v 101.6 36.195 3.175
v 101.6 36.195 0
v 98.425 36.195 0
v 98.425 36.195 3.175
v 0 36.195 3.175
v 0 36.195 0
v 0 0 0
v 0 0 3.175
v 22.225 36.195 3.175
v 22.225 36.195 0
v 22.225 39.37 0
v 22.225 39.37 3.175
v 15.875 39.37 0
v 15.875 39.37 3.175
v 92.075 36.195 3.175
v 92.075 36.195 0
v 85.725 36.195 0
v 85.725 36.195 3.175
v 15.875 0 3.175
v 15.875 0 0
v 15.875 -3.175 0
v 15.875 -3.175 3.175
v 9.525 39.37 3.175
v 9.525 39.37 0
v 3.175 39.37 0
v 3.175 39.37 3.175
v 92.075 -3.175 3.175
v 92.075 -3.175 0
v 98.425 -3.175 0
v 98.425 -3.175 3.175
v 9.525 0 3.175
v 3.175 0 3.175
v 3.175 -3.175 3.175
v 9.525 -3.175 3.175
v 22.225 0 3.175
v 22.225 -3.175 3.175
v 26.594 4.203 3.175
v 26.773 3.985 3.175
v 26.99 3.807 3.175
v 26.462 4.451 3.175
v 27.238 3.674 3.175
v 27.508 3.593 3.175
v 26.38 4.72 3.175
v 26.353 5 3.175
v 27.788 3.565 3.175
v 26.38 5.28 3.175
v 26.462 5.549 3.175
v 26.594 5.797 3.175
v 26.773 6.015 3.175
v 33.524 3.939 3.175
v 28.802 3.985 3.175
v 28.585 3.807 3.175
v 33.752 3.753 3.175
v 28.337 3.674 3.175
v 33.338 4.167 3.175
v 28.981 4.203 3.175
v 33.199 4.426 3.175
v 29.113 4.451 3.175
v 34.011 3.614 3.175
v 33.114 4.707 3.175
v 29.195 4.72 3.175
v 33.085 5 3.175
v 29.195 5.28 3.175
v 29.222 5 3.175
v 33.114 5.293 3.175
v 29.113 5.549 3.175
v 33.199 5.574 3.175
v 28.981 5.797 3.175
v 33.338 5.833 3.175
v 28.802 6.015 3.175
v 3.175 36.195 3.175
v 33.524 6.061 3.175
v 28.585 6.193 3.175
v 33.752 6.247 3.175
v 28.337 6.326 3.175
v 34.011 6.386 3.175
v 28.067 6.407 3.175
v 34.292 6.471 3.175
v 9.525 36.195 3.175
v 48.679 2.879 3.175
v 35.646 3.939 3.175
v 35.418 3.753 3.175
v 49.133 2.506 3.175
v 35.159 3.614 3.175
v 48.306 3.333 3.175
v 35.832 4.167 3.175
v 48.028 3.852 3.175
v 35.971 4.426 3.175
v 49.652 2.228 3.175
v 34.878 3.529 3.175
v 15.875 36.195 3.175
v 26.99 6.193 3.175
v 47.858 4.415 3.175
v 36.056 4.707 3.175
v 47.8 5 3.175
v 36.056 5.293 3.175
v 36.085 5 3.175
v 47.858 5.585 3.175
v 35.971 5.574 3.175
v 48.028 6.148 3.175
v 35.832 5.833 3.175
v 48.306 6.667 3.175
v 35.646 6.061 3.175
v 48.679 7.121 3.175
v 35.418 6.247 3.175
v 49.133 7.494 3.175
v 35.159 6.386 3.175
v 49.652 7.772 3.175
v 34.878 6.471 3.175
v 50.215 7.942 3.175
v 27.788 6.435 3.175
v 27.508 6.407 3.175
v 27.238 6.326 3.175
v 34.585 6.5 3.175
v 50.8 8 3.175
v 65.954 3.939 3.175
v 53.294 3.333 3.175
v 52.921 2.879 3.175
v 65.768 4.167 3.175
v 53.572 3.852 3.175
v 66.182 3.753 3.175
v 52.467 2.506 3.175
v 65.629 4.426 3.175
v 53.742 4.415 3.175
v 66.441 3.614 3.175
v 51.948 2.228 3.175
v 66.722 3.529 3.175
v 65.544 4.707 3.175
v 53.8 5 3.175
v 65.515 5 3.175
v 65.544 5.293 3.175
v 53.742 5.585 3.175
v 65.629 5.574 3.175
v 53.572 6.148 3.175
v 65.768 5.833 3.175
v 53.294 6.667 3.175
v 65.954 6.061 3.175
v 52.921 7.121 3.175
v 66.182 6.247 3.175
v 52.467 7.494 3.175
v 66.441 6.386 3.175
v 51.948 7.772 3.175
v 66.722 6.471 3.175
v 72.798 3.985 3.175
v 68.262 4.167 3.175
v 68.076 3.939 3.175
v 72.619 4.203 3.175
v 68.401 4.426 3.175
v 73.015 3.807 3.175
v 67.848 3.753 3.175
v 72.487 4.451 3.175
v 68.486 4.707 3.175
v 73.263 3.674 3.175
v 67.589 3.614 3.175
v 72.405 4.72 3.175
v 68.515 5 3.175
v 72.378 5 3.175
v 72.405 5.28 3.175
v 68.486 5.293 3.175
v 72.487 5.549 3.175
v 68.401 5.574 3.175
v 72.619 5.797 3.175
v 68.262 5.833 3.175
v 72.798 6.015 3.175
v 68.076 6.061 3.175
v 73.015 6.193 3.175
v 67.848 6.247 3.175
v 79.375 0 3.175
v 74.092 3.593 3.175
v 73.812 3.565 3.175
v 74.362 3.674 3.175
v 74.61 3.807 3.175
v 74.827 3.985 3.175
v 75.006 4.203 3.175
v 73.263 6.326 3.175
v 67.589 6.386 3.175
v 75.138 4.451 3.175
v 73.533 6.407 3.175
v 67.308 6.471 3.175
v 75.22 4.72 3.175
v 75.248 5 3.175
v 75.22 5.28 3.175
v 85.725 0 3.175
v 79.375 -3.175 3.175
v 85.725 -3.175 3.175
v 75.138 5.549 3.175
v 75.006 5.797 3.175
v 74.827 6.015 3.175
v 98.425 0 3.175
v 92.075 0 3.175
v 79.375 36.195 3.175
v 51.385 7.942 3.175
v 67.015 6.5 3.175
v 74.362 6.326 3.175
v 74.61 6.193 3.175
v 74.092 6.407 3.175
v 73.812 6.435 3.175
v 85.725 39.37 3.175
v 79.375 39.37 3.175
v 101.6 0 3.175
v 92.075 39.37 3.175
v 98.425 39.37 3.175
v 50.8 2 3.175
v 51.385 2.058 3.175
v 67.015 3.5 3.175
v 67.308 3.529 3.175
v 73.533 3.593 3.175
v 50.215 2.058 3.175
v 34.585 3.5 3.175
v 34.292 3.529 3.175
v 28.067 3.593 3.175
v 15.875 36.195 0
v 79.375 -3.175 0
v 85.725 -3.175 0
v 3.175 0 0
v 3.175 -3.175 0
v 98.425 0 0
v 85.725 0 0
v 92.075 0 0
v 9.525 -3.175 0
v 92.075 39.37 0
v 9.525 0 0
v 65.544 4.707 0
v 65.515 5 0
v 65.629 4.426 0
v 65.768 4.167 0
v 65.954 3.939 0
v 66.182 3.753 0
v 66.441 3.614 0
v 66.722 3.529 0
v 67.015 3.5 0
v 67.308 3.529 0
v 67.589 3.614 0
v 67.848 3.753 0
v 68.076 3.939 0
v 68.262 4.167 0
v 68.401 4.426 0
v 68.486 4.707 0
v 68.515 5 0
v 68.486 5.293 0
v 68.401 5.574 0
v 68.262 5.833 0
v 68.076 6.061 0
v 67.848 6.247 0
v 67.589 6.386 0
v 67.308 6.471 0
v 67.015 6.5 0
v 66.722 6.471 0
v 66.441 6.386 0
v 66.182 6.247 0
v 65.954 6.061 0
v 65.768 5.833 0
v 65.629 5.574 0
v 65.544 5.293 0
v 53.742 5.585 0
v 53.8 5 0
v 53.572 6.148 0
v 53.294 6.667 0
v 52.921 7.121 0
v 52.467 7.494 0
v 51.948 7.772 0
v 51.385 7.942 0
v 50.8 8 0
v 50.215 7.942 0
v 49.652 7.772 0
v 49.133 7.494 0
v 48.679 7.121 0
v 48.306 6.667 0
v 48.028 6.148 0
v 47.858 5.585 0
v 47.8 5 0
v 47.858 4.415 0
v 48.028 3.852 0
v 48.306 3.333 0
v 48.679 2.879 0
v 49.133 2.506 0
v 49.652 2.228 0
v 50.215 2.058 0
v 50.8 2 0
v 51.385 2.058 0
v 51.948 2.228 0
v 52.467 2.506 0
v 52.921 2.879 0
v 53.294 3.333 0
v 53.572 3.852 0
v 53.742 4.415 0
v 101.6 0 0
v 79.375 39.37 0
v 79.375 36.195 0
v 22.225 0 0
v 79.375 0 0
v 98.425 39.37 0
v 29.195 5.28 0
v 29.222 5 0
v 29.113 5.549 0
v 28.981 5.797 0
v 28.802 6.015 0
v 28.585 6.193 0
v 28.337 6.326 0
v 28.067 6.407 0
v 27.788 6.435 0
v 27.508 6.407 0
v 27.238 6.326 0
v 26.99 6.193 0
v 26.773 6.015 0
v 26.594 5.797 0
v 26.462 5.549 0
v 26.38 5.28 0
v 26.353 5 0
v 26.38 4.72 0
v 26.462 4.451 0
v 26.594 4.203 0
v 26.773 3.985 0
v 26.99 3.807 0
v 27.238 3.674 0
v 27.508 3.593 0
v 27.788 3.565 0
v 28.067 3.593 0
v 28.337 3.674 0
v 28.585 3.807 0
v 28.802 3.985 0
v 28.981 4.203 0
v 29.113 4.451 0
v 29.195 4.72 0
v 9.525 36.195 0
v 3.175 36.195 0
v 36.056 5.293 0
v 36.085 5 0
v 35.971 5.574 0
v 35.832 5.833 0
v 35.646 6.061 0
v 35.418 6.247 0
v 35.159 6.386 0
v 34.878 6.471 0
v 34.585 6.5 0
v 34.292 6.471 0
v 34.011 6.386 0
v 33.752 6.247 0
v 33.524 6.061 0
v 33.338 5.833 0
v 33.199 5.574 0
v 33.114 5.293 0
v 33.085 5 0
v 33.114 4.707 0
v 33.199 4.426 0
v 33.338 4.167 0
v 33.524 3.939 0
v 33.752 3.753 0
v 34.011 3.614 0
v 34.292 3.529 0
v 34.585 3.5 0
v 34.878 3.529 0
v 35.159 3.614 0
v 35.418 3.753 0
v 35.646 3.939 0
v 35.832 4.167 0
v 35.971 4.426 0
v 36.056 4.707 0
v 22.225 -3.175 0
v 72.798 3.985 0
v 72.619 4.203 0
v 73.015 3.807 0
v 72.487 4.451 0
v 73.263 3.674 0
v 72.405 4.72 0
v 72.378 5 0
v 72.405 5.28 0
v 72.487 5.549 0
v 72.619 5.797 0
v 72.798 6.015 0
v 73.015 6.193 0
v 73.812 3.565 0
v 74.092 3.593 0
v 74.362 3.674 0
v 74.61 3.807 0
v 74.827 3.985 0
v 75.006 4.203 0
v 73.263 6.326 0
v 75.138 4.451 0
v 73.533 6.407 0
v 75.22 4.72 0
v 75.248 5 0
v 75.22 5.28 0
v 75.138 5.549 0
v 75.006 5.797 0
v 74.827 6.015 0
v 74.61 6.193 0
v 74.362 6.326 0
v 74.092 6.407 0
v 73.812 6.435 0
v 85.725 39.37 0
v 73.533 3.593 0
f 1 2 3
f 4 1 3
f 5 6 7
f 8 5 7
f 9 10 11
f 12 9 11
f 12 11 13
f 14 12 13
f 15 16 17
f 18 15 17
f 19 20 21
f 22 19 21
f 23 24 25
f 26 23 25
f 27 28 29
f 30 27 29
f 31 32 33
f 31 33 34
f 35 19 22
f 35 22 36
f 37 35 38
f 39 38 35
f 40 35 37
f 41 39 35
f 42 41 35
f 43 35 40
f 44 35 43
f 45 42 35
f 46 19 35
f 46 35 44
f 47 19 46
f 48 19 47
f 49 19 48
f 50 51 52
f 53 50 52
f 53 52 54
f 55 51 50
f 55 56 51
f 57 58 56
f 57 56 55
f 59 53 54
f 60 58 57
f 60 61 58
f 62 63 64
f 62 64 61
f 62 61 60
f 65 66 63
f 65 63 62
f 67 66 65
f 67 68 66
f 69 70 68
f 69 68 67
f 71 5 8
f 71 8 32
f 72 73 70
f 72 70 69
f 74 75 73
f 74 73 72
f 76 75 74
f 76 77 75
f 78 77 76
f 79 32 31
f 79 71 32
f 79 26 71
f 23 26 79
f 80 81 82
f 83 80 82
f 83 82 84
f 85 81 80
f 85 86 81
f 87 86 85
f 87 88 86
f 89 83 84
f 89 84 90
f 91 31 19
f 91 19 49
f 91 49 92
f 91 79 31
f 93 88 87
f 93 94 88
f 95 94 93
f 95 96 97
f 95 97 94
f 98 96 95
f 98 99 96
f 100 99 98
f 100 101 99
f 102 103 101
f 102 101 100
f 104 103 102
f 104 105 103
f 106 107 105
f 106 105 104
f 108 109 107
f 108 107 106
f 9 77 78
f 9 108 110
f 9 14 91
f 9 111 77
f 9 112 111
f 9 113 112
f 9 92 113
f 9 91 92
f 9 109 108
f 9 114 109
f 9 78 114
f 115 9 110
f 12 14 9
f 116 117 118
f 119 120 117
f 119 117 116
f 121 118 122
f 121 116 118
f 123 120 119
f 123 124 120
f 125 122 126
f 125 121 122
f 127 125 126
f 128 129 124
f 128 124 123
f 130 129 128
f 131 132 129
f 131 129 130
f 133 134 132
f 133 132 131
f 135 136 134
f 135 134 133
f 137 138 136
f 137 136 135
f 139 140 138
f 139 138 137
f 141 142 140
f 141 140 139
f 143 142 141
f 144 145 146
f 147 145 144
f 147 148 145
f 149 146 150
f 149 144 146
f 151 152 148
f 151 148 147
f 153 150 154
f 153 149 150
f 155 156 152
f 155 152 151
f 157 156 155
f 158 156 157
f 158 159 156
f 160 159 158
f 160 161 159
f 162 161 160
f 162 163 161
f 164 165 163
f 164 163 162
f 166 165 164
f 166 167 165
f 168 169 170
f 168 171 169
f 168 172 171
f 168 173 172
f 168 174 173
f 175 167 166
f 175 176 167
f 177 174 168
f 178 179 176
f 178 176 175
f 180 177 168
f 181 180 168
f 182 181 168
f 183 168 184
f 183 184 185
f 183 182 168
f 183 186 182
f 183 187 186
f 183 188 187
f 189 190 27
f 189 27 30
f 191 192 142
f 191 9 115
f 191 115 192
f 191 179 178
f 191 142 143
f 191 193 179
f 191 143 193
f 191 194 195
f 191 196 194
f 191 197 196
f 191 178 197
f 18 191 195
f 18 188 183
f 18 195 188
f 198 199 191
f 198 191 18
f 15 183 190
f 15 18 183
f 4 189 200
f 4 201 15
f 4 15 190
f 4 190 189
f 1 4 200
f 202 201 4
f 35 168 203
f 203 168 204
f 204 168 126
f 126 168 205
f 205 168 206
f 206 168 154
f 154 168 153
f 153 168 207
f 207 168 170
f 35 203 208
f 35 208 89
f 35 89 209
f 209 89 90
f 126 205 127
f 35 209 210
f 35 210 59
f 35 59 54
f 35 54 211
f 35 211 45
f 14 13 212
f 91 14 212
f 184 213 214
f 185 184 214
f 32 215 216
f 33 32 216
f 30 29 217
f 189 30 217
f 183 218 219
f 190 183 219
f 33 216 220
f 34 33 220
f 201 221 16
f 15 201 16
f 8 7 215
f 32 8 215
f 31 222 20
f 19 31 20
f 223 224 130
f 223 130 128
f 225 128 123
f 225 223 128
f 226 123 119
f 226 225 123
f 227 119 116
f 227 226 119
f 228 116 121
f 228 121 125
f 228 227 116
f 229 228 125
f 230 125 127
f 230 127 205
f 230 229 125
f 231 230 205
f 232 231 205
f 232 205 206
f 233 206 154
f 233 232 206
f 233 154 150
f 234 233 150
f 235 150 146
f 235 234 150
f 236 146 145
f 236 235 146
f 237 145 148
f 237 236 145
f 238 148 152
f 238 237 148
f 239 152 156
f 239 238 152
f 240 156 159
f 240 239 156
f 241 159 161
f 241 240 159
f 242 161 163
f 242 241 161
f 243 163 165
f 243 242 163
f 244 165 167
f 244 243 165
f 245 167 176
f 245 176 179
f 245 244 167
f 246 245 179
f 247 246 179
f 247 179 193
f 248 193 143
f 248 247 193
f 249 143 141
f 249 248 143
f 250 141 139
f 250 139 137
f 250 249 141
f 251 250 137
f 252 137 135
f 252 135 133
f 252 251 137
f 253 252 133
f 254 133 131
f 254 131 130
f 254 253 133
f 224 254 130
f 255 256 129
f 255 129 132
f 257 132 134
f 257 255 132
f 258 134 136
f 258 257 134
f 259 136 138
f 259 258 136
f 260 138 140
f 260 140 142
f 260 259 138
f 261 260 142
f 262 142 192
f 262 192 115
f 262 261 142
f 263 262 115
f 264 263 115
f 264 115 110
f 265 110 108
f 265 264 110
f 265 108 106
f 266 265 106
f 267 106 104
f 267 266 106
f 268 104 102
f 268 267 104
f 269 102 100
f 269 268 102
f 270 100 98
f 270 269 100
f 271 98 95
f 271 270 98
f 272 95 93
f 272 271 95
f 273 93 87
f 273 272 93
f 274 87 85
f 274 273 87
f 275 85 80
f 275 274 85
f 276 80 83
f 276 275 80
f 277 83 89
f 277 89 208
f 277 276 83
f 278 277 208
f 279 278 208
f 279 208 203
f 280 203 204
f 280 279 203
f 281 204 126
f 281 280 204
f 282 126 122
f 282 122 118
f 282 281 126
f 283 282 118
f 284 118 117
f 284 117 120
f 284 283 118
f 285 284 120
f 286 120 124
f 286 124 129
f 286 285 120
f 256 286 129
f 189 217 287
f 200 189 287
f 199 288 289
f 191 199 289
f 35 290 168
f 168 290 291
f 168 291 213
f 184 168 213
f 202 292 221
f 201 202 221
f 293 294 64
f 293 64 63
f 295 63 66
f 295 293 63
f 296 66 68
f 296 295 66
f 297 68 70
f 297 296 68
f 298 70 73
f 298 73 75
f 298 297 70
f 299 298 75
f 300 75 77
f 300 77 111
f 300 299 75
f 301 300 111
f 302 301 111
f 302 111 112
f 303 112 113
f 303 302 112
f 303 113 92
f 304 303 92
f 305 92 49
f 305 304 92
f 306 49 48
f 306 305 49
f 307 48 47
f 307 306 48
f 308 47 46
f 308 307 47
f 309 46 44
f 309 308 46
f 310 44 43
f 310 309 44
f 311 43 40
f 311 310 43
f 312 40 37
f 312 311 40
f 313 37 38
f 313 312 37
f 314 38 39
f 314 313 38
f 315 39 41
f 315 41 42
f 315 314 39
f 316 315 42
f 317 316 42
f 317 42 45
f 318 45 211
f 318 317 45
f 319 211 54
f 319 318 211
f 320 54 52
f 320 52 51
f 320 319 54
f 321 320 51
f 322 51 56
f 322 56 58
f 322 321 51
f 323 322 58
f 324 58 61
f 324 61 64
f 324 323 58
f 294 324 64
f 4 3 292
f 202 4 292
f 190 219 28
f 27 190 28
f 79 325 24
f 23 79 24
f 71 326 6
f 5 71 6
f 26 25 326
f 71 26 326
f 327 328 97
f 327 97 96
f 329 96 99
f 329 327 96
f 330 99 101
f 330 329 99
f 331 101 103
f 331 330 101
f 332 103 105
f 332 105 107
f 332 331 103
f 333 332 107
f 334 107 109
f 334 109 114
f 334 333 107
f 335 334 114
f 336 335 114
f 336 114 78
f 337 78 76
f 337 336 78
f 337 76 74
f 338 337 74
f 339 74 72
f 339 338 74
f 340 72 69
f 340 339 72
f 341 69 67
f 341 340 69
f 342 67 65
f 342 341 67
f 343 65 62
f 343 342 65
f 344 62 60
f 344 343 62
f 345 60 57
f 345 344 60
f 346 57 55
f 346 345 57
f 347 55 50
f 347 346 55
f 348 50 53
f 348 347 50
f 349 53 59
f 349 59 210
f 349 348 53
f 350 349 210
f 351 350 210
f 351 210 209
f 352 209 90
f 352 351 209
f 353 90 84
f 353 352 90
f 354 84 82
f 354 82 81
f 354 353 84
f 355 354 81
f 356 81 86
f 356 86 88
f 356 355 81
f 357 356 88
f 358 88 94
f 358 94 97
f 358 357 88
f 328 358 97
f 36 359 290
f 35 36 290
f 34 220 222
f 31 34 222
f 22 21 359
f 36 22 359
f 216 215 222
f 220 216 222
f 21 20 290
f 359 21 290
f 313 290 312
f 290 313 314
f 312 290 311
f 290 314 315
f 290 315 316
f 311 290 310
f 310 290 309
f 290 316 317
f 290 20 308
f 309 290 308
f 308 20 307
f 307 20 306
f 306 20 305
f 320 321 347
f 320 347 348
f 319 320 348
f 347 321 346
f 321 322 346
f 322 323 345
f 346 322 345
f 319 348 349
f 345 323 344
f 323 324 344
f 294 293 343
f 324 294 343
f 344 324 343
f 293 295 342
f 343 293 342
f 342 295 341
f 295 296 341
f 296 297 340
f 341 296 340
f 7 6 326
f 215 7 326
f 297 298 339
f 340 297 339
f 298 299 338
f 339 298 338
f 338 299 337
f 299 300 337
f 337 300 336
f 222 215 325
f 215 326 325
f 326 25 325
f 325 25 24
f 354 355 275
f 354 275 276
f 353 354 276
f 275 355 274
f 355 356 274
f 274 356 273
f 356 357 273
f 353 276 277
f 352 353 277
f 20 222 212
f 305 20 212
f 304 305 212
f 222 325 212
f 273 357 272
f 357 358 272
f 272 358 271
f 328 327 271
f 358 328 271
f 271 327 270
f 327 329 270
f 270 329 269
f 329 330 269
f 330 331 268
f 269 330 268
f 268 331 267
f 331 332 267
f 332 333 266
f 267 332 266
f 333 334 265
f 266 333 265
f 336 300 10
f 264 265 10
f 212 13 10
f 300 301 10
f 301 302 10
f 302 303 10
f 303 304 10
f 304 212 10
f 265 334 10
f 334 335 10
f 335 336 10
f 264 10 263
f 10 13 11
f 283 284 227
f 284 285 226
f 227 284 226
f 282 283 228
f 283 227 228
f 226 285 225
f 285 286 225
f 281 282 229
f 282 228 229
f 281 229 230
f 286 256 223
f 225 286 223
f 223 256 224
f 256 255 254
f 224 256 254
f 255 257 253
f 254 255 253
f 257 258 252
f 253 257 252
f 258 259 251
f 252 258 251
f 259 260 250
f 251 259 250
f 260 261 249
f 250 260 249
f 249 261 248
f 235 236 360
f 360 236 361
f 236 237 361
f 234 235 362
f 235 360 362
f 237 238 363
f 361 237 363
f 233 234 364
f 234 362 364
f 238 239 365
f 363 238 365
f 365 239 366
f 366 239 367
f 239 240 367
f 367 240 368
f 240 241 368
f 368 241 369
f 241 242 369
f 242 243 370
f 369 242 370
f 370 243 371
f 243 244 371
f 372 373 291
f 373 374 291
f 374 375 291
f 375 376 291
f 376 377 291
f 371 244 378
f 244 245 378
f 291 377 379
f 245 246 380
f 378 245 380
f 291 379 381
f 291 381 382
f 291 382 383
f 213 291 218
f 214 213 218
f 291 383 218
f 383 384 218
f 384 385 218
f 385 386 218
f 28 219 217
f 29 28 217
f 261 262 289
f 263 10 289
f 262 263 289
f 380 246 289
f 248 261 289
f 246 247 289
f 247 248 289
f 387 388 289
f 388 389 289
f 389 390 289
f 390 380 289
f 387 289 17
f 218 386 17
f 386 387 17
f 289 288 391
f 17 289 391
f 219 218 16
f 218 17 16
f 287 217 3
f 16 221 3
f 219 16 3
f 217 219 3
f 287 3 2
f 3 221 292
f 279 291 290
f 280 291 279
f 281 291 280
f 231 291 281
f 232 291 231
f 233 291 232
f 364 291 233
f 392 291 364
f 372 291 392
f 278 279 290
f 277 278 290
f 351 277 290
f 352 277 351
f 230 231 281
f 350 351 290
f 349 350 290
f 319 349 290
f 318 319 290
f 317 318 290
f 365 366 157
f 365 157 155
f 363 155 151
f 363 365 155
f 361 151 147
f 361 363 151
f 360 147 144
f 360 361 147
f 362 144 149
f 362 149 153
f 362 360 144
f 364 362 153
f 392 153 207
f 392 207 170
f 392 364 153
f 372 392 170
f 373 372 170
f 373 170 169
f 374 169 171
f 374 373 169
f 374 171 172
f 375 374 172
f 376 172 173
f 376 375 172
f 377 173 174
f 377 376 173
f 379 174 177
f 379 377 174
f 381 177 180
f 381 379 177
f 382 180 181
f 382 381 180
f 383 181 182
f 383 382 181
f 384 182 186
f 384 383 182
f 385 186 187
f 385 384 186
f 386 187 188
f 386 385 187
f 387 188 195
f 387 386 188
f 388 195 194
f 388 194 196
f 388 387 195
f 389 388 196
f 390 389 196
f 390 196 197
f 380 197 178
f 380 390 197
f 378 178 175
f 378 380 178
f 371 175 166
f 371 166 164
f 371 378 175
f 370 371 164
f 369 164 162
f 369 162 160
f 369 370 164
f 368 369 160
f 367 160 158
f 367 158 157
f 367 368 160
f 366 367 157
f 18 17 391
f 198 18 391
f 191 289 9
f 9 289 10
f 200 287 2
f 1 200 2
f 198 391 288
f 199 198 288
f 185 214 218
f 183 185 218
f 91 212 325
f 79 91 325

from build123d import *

# Parameters (mm, degrees)
SKETCH1_R           = 1.5
SKETCH1_R_2         = 1.435
SKETCH1_R_3         = 3
BOSS_EXTRUDE1_DEPTH = 3.175


with BuildPart() as part:
    # Sketch1 → Boss-Extrude1 (new body)
    with BuildSketch(Plane.XY):
        Polygon((3.175, 0), (3.175, -3.175), (9.525, -3.175), (9.525, 0), (15.875, 0), (15.875, -3.175), (22.225, -3.175), (22.225, 0), (79.375, 0), (79.375, -3.175), (85.725, -3.175), (85.725, 0), (92.075, 0), (92.075, -3.175), (98.425, -3.175), (98.425, 0), (101.6, 0), (101.6, 36.195), (98.425, 36.195), (98.425, 39.37), (92.075, 39.37), (92.075, 36.195), (85.725, 36.195), (85.725, 39.37), (79.375, 39.37), (79.375, 36.195), (22.225, 36.195), (22.225, 39.37), (15.875, 39.37), (15.875, 36.195), (9.525, 36.195), (9.525, 39.37), (3.175, 39.37), (3.175, 36.195), (0, 36.195), (0, 0), align=None)
        with Locations((34.585, 5)):
            Circle(SKETCH1_R, mode=Mode.SUBTRACT)
        with Locations((27.7875, 5)):
            Circle(SKETCH1_R_2, mode=Mode.SUBTRACT)
        with Locations(Location((67.015, 5, 0), (0, 0, 180))):
            Circle(SKETCH1_R, mode=Mode.SUBTRACT)
        with Locations(Location((73.8125, 5, 0), (0, 0, 180))):
            Circle(SKETCH1_R_2, mode=Mode.SUBTRACT)
        with Locations((50.8, 5)):
            Circle(SKETCH1_R_3, mode=Mode.SUBTRACT)
    extrude(amount=BOSS_EXTRUDE1_DEPTH)


solid = part.part
